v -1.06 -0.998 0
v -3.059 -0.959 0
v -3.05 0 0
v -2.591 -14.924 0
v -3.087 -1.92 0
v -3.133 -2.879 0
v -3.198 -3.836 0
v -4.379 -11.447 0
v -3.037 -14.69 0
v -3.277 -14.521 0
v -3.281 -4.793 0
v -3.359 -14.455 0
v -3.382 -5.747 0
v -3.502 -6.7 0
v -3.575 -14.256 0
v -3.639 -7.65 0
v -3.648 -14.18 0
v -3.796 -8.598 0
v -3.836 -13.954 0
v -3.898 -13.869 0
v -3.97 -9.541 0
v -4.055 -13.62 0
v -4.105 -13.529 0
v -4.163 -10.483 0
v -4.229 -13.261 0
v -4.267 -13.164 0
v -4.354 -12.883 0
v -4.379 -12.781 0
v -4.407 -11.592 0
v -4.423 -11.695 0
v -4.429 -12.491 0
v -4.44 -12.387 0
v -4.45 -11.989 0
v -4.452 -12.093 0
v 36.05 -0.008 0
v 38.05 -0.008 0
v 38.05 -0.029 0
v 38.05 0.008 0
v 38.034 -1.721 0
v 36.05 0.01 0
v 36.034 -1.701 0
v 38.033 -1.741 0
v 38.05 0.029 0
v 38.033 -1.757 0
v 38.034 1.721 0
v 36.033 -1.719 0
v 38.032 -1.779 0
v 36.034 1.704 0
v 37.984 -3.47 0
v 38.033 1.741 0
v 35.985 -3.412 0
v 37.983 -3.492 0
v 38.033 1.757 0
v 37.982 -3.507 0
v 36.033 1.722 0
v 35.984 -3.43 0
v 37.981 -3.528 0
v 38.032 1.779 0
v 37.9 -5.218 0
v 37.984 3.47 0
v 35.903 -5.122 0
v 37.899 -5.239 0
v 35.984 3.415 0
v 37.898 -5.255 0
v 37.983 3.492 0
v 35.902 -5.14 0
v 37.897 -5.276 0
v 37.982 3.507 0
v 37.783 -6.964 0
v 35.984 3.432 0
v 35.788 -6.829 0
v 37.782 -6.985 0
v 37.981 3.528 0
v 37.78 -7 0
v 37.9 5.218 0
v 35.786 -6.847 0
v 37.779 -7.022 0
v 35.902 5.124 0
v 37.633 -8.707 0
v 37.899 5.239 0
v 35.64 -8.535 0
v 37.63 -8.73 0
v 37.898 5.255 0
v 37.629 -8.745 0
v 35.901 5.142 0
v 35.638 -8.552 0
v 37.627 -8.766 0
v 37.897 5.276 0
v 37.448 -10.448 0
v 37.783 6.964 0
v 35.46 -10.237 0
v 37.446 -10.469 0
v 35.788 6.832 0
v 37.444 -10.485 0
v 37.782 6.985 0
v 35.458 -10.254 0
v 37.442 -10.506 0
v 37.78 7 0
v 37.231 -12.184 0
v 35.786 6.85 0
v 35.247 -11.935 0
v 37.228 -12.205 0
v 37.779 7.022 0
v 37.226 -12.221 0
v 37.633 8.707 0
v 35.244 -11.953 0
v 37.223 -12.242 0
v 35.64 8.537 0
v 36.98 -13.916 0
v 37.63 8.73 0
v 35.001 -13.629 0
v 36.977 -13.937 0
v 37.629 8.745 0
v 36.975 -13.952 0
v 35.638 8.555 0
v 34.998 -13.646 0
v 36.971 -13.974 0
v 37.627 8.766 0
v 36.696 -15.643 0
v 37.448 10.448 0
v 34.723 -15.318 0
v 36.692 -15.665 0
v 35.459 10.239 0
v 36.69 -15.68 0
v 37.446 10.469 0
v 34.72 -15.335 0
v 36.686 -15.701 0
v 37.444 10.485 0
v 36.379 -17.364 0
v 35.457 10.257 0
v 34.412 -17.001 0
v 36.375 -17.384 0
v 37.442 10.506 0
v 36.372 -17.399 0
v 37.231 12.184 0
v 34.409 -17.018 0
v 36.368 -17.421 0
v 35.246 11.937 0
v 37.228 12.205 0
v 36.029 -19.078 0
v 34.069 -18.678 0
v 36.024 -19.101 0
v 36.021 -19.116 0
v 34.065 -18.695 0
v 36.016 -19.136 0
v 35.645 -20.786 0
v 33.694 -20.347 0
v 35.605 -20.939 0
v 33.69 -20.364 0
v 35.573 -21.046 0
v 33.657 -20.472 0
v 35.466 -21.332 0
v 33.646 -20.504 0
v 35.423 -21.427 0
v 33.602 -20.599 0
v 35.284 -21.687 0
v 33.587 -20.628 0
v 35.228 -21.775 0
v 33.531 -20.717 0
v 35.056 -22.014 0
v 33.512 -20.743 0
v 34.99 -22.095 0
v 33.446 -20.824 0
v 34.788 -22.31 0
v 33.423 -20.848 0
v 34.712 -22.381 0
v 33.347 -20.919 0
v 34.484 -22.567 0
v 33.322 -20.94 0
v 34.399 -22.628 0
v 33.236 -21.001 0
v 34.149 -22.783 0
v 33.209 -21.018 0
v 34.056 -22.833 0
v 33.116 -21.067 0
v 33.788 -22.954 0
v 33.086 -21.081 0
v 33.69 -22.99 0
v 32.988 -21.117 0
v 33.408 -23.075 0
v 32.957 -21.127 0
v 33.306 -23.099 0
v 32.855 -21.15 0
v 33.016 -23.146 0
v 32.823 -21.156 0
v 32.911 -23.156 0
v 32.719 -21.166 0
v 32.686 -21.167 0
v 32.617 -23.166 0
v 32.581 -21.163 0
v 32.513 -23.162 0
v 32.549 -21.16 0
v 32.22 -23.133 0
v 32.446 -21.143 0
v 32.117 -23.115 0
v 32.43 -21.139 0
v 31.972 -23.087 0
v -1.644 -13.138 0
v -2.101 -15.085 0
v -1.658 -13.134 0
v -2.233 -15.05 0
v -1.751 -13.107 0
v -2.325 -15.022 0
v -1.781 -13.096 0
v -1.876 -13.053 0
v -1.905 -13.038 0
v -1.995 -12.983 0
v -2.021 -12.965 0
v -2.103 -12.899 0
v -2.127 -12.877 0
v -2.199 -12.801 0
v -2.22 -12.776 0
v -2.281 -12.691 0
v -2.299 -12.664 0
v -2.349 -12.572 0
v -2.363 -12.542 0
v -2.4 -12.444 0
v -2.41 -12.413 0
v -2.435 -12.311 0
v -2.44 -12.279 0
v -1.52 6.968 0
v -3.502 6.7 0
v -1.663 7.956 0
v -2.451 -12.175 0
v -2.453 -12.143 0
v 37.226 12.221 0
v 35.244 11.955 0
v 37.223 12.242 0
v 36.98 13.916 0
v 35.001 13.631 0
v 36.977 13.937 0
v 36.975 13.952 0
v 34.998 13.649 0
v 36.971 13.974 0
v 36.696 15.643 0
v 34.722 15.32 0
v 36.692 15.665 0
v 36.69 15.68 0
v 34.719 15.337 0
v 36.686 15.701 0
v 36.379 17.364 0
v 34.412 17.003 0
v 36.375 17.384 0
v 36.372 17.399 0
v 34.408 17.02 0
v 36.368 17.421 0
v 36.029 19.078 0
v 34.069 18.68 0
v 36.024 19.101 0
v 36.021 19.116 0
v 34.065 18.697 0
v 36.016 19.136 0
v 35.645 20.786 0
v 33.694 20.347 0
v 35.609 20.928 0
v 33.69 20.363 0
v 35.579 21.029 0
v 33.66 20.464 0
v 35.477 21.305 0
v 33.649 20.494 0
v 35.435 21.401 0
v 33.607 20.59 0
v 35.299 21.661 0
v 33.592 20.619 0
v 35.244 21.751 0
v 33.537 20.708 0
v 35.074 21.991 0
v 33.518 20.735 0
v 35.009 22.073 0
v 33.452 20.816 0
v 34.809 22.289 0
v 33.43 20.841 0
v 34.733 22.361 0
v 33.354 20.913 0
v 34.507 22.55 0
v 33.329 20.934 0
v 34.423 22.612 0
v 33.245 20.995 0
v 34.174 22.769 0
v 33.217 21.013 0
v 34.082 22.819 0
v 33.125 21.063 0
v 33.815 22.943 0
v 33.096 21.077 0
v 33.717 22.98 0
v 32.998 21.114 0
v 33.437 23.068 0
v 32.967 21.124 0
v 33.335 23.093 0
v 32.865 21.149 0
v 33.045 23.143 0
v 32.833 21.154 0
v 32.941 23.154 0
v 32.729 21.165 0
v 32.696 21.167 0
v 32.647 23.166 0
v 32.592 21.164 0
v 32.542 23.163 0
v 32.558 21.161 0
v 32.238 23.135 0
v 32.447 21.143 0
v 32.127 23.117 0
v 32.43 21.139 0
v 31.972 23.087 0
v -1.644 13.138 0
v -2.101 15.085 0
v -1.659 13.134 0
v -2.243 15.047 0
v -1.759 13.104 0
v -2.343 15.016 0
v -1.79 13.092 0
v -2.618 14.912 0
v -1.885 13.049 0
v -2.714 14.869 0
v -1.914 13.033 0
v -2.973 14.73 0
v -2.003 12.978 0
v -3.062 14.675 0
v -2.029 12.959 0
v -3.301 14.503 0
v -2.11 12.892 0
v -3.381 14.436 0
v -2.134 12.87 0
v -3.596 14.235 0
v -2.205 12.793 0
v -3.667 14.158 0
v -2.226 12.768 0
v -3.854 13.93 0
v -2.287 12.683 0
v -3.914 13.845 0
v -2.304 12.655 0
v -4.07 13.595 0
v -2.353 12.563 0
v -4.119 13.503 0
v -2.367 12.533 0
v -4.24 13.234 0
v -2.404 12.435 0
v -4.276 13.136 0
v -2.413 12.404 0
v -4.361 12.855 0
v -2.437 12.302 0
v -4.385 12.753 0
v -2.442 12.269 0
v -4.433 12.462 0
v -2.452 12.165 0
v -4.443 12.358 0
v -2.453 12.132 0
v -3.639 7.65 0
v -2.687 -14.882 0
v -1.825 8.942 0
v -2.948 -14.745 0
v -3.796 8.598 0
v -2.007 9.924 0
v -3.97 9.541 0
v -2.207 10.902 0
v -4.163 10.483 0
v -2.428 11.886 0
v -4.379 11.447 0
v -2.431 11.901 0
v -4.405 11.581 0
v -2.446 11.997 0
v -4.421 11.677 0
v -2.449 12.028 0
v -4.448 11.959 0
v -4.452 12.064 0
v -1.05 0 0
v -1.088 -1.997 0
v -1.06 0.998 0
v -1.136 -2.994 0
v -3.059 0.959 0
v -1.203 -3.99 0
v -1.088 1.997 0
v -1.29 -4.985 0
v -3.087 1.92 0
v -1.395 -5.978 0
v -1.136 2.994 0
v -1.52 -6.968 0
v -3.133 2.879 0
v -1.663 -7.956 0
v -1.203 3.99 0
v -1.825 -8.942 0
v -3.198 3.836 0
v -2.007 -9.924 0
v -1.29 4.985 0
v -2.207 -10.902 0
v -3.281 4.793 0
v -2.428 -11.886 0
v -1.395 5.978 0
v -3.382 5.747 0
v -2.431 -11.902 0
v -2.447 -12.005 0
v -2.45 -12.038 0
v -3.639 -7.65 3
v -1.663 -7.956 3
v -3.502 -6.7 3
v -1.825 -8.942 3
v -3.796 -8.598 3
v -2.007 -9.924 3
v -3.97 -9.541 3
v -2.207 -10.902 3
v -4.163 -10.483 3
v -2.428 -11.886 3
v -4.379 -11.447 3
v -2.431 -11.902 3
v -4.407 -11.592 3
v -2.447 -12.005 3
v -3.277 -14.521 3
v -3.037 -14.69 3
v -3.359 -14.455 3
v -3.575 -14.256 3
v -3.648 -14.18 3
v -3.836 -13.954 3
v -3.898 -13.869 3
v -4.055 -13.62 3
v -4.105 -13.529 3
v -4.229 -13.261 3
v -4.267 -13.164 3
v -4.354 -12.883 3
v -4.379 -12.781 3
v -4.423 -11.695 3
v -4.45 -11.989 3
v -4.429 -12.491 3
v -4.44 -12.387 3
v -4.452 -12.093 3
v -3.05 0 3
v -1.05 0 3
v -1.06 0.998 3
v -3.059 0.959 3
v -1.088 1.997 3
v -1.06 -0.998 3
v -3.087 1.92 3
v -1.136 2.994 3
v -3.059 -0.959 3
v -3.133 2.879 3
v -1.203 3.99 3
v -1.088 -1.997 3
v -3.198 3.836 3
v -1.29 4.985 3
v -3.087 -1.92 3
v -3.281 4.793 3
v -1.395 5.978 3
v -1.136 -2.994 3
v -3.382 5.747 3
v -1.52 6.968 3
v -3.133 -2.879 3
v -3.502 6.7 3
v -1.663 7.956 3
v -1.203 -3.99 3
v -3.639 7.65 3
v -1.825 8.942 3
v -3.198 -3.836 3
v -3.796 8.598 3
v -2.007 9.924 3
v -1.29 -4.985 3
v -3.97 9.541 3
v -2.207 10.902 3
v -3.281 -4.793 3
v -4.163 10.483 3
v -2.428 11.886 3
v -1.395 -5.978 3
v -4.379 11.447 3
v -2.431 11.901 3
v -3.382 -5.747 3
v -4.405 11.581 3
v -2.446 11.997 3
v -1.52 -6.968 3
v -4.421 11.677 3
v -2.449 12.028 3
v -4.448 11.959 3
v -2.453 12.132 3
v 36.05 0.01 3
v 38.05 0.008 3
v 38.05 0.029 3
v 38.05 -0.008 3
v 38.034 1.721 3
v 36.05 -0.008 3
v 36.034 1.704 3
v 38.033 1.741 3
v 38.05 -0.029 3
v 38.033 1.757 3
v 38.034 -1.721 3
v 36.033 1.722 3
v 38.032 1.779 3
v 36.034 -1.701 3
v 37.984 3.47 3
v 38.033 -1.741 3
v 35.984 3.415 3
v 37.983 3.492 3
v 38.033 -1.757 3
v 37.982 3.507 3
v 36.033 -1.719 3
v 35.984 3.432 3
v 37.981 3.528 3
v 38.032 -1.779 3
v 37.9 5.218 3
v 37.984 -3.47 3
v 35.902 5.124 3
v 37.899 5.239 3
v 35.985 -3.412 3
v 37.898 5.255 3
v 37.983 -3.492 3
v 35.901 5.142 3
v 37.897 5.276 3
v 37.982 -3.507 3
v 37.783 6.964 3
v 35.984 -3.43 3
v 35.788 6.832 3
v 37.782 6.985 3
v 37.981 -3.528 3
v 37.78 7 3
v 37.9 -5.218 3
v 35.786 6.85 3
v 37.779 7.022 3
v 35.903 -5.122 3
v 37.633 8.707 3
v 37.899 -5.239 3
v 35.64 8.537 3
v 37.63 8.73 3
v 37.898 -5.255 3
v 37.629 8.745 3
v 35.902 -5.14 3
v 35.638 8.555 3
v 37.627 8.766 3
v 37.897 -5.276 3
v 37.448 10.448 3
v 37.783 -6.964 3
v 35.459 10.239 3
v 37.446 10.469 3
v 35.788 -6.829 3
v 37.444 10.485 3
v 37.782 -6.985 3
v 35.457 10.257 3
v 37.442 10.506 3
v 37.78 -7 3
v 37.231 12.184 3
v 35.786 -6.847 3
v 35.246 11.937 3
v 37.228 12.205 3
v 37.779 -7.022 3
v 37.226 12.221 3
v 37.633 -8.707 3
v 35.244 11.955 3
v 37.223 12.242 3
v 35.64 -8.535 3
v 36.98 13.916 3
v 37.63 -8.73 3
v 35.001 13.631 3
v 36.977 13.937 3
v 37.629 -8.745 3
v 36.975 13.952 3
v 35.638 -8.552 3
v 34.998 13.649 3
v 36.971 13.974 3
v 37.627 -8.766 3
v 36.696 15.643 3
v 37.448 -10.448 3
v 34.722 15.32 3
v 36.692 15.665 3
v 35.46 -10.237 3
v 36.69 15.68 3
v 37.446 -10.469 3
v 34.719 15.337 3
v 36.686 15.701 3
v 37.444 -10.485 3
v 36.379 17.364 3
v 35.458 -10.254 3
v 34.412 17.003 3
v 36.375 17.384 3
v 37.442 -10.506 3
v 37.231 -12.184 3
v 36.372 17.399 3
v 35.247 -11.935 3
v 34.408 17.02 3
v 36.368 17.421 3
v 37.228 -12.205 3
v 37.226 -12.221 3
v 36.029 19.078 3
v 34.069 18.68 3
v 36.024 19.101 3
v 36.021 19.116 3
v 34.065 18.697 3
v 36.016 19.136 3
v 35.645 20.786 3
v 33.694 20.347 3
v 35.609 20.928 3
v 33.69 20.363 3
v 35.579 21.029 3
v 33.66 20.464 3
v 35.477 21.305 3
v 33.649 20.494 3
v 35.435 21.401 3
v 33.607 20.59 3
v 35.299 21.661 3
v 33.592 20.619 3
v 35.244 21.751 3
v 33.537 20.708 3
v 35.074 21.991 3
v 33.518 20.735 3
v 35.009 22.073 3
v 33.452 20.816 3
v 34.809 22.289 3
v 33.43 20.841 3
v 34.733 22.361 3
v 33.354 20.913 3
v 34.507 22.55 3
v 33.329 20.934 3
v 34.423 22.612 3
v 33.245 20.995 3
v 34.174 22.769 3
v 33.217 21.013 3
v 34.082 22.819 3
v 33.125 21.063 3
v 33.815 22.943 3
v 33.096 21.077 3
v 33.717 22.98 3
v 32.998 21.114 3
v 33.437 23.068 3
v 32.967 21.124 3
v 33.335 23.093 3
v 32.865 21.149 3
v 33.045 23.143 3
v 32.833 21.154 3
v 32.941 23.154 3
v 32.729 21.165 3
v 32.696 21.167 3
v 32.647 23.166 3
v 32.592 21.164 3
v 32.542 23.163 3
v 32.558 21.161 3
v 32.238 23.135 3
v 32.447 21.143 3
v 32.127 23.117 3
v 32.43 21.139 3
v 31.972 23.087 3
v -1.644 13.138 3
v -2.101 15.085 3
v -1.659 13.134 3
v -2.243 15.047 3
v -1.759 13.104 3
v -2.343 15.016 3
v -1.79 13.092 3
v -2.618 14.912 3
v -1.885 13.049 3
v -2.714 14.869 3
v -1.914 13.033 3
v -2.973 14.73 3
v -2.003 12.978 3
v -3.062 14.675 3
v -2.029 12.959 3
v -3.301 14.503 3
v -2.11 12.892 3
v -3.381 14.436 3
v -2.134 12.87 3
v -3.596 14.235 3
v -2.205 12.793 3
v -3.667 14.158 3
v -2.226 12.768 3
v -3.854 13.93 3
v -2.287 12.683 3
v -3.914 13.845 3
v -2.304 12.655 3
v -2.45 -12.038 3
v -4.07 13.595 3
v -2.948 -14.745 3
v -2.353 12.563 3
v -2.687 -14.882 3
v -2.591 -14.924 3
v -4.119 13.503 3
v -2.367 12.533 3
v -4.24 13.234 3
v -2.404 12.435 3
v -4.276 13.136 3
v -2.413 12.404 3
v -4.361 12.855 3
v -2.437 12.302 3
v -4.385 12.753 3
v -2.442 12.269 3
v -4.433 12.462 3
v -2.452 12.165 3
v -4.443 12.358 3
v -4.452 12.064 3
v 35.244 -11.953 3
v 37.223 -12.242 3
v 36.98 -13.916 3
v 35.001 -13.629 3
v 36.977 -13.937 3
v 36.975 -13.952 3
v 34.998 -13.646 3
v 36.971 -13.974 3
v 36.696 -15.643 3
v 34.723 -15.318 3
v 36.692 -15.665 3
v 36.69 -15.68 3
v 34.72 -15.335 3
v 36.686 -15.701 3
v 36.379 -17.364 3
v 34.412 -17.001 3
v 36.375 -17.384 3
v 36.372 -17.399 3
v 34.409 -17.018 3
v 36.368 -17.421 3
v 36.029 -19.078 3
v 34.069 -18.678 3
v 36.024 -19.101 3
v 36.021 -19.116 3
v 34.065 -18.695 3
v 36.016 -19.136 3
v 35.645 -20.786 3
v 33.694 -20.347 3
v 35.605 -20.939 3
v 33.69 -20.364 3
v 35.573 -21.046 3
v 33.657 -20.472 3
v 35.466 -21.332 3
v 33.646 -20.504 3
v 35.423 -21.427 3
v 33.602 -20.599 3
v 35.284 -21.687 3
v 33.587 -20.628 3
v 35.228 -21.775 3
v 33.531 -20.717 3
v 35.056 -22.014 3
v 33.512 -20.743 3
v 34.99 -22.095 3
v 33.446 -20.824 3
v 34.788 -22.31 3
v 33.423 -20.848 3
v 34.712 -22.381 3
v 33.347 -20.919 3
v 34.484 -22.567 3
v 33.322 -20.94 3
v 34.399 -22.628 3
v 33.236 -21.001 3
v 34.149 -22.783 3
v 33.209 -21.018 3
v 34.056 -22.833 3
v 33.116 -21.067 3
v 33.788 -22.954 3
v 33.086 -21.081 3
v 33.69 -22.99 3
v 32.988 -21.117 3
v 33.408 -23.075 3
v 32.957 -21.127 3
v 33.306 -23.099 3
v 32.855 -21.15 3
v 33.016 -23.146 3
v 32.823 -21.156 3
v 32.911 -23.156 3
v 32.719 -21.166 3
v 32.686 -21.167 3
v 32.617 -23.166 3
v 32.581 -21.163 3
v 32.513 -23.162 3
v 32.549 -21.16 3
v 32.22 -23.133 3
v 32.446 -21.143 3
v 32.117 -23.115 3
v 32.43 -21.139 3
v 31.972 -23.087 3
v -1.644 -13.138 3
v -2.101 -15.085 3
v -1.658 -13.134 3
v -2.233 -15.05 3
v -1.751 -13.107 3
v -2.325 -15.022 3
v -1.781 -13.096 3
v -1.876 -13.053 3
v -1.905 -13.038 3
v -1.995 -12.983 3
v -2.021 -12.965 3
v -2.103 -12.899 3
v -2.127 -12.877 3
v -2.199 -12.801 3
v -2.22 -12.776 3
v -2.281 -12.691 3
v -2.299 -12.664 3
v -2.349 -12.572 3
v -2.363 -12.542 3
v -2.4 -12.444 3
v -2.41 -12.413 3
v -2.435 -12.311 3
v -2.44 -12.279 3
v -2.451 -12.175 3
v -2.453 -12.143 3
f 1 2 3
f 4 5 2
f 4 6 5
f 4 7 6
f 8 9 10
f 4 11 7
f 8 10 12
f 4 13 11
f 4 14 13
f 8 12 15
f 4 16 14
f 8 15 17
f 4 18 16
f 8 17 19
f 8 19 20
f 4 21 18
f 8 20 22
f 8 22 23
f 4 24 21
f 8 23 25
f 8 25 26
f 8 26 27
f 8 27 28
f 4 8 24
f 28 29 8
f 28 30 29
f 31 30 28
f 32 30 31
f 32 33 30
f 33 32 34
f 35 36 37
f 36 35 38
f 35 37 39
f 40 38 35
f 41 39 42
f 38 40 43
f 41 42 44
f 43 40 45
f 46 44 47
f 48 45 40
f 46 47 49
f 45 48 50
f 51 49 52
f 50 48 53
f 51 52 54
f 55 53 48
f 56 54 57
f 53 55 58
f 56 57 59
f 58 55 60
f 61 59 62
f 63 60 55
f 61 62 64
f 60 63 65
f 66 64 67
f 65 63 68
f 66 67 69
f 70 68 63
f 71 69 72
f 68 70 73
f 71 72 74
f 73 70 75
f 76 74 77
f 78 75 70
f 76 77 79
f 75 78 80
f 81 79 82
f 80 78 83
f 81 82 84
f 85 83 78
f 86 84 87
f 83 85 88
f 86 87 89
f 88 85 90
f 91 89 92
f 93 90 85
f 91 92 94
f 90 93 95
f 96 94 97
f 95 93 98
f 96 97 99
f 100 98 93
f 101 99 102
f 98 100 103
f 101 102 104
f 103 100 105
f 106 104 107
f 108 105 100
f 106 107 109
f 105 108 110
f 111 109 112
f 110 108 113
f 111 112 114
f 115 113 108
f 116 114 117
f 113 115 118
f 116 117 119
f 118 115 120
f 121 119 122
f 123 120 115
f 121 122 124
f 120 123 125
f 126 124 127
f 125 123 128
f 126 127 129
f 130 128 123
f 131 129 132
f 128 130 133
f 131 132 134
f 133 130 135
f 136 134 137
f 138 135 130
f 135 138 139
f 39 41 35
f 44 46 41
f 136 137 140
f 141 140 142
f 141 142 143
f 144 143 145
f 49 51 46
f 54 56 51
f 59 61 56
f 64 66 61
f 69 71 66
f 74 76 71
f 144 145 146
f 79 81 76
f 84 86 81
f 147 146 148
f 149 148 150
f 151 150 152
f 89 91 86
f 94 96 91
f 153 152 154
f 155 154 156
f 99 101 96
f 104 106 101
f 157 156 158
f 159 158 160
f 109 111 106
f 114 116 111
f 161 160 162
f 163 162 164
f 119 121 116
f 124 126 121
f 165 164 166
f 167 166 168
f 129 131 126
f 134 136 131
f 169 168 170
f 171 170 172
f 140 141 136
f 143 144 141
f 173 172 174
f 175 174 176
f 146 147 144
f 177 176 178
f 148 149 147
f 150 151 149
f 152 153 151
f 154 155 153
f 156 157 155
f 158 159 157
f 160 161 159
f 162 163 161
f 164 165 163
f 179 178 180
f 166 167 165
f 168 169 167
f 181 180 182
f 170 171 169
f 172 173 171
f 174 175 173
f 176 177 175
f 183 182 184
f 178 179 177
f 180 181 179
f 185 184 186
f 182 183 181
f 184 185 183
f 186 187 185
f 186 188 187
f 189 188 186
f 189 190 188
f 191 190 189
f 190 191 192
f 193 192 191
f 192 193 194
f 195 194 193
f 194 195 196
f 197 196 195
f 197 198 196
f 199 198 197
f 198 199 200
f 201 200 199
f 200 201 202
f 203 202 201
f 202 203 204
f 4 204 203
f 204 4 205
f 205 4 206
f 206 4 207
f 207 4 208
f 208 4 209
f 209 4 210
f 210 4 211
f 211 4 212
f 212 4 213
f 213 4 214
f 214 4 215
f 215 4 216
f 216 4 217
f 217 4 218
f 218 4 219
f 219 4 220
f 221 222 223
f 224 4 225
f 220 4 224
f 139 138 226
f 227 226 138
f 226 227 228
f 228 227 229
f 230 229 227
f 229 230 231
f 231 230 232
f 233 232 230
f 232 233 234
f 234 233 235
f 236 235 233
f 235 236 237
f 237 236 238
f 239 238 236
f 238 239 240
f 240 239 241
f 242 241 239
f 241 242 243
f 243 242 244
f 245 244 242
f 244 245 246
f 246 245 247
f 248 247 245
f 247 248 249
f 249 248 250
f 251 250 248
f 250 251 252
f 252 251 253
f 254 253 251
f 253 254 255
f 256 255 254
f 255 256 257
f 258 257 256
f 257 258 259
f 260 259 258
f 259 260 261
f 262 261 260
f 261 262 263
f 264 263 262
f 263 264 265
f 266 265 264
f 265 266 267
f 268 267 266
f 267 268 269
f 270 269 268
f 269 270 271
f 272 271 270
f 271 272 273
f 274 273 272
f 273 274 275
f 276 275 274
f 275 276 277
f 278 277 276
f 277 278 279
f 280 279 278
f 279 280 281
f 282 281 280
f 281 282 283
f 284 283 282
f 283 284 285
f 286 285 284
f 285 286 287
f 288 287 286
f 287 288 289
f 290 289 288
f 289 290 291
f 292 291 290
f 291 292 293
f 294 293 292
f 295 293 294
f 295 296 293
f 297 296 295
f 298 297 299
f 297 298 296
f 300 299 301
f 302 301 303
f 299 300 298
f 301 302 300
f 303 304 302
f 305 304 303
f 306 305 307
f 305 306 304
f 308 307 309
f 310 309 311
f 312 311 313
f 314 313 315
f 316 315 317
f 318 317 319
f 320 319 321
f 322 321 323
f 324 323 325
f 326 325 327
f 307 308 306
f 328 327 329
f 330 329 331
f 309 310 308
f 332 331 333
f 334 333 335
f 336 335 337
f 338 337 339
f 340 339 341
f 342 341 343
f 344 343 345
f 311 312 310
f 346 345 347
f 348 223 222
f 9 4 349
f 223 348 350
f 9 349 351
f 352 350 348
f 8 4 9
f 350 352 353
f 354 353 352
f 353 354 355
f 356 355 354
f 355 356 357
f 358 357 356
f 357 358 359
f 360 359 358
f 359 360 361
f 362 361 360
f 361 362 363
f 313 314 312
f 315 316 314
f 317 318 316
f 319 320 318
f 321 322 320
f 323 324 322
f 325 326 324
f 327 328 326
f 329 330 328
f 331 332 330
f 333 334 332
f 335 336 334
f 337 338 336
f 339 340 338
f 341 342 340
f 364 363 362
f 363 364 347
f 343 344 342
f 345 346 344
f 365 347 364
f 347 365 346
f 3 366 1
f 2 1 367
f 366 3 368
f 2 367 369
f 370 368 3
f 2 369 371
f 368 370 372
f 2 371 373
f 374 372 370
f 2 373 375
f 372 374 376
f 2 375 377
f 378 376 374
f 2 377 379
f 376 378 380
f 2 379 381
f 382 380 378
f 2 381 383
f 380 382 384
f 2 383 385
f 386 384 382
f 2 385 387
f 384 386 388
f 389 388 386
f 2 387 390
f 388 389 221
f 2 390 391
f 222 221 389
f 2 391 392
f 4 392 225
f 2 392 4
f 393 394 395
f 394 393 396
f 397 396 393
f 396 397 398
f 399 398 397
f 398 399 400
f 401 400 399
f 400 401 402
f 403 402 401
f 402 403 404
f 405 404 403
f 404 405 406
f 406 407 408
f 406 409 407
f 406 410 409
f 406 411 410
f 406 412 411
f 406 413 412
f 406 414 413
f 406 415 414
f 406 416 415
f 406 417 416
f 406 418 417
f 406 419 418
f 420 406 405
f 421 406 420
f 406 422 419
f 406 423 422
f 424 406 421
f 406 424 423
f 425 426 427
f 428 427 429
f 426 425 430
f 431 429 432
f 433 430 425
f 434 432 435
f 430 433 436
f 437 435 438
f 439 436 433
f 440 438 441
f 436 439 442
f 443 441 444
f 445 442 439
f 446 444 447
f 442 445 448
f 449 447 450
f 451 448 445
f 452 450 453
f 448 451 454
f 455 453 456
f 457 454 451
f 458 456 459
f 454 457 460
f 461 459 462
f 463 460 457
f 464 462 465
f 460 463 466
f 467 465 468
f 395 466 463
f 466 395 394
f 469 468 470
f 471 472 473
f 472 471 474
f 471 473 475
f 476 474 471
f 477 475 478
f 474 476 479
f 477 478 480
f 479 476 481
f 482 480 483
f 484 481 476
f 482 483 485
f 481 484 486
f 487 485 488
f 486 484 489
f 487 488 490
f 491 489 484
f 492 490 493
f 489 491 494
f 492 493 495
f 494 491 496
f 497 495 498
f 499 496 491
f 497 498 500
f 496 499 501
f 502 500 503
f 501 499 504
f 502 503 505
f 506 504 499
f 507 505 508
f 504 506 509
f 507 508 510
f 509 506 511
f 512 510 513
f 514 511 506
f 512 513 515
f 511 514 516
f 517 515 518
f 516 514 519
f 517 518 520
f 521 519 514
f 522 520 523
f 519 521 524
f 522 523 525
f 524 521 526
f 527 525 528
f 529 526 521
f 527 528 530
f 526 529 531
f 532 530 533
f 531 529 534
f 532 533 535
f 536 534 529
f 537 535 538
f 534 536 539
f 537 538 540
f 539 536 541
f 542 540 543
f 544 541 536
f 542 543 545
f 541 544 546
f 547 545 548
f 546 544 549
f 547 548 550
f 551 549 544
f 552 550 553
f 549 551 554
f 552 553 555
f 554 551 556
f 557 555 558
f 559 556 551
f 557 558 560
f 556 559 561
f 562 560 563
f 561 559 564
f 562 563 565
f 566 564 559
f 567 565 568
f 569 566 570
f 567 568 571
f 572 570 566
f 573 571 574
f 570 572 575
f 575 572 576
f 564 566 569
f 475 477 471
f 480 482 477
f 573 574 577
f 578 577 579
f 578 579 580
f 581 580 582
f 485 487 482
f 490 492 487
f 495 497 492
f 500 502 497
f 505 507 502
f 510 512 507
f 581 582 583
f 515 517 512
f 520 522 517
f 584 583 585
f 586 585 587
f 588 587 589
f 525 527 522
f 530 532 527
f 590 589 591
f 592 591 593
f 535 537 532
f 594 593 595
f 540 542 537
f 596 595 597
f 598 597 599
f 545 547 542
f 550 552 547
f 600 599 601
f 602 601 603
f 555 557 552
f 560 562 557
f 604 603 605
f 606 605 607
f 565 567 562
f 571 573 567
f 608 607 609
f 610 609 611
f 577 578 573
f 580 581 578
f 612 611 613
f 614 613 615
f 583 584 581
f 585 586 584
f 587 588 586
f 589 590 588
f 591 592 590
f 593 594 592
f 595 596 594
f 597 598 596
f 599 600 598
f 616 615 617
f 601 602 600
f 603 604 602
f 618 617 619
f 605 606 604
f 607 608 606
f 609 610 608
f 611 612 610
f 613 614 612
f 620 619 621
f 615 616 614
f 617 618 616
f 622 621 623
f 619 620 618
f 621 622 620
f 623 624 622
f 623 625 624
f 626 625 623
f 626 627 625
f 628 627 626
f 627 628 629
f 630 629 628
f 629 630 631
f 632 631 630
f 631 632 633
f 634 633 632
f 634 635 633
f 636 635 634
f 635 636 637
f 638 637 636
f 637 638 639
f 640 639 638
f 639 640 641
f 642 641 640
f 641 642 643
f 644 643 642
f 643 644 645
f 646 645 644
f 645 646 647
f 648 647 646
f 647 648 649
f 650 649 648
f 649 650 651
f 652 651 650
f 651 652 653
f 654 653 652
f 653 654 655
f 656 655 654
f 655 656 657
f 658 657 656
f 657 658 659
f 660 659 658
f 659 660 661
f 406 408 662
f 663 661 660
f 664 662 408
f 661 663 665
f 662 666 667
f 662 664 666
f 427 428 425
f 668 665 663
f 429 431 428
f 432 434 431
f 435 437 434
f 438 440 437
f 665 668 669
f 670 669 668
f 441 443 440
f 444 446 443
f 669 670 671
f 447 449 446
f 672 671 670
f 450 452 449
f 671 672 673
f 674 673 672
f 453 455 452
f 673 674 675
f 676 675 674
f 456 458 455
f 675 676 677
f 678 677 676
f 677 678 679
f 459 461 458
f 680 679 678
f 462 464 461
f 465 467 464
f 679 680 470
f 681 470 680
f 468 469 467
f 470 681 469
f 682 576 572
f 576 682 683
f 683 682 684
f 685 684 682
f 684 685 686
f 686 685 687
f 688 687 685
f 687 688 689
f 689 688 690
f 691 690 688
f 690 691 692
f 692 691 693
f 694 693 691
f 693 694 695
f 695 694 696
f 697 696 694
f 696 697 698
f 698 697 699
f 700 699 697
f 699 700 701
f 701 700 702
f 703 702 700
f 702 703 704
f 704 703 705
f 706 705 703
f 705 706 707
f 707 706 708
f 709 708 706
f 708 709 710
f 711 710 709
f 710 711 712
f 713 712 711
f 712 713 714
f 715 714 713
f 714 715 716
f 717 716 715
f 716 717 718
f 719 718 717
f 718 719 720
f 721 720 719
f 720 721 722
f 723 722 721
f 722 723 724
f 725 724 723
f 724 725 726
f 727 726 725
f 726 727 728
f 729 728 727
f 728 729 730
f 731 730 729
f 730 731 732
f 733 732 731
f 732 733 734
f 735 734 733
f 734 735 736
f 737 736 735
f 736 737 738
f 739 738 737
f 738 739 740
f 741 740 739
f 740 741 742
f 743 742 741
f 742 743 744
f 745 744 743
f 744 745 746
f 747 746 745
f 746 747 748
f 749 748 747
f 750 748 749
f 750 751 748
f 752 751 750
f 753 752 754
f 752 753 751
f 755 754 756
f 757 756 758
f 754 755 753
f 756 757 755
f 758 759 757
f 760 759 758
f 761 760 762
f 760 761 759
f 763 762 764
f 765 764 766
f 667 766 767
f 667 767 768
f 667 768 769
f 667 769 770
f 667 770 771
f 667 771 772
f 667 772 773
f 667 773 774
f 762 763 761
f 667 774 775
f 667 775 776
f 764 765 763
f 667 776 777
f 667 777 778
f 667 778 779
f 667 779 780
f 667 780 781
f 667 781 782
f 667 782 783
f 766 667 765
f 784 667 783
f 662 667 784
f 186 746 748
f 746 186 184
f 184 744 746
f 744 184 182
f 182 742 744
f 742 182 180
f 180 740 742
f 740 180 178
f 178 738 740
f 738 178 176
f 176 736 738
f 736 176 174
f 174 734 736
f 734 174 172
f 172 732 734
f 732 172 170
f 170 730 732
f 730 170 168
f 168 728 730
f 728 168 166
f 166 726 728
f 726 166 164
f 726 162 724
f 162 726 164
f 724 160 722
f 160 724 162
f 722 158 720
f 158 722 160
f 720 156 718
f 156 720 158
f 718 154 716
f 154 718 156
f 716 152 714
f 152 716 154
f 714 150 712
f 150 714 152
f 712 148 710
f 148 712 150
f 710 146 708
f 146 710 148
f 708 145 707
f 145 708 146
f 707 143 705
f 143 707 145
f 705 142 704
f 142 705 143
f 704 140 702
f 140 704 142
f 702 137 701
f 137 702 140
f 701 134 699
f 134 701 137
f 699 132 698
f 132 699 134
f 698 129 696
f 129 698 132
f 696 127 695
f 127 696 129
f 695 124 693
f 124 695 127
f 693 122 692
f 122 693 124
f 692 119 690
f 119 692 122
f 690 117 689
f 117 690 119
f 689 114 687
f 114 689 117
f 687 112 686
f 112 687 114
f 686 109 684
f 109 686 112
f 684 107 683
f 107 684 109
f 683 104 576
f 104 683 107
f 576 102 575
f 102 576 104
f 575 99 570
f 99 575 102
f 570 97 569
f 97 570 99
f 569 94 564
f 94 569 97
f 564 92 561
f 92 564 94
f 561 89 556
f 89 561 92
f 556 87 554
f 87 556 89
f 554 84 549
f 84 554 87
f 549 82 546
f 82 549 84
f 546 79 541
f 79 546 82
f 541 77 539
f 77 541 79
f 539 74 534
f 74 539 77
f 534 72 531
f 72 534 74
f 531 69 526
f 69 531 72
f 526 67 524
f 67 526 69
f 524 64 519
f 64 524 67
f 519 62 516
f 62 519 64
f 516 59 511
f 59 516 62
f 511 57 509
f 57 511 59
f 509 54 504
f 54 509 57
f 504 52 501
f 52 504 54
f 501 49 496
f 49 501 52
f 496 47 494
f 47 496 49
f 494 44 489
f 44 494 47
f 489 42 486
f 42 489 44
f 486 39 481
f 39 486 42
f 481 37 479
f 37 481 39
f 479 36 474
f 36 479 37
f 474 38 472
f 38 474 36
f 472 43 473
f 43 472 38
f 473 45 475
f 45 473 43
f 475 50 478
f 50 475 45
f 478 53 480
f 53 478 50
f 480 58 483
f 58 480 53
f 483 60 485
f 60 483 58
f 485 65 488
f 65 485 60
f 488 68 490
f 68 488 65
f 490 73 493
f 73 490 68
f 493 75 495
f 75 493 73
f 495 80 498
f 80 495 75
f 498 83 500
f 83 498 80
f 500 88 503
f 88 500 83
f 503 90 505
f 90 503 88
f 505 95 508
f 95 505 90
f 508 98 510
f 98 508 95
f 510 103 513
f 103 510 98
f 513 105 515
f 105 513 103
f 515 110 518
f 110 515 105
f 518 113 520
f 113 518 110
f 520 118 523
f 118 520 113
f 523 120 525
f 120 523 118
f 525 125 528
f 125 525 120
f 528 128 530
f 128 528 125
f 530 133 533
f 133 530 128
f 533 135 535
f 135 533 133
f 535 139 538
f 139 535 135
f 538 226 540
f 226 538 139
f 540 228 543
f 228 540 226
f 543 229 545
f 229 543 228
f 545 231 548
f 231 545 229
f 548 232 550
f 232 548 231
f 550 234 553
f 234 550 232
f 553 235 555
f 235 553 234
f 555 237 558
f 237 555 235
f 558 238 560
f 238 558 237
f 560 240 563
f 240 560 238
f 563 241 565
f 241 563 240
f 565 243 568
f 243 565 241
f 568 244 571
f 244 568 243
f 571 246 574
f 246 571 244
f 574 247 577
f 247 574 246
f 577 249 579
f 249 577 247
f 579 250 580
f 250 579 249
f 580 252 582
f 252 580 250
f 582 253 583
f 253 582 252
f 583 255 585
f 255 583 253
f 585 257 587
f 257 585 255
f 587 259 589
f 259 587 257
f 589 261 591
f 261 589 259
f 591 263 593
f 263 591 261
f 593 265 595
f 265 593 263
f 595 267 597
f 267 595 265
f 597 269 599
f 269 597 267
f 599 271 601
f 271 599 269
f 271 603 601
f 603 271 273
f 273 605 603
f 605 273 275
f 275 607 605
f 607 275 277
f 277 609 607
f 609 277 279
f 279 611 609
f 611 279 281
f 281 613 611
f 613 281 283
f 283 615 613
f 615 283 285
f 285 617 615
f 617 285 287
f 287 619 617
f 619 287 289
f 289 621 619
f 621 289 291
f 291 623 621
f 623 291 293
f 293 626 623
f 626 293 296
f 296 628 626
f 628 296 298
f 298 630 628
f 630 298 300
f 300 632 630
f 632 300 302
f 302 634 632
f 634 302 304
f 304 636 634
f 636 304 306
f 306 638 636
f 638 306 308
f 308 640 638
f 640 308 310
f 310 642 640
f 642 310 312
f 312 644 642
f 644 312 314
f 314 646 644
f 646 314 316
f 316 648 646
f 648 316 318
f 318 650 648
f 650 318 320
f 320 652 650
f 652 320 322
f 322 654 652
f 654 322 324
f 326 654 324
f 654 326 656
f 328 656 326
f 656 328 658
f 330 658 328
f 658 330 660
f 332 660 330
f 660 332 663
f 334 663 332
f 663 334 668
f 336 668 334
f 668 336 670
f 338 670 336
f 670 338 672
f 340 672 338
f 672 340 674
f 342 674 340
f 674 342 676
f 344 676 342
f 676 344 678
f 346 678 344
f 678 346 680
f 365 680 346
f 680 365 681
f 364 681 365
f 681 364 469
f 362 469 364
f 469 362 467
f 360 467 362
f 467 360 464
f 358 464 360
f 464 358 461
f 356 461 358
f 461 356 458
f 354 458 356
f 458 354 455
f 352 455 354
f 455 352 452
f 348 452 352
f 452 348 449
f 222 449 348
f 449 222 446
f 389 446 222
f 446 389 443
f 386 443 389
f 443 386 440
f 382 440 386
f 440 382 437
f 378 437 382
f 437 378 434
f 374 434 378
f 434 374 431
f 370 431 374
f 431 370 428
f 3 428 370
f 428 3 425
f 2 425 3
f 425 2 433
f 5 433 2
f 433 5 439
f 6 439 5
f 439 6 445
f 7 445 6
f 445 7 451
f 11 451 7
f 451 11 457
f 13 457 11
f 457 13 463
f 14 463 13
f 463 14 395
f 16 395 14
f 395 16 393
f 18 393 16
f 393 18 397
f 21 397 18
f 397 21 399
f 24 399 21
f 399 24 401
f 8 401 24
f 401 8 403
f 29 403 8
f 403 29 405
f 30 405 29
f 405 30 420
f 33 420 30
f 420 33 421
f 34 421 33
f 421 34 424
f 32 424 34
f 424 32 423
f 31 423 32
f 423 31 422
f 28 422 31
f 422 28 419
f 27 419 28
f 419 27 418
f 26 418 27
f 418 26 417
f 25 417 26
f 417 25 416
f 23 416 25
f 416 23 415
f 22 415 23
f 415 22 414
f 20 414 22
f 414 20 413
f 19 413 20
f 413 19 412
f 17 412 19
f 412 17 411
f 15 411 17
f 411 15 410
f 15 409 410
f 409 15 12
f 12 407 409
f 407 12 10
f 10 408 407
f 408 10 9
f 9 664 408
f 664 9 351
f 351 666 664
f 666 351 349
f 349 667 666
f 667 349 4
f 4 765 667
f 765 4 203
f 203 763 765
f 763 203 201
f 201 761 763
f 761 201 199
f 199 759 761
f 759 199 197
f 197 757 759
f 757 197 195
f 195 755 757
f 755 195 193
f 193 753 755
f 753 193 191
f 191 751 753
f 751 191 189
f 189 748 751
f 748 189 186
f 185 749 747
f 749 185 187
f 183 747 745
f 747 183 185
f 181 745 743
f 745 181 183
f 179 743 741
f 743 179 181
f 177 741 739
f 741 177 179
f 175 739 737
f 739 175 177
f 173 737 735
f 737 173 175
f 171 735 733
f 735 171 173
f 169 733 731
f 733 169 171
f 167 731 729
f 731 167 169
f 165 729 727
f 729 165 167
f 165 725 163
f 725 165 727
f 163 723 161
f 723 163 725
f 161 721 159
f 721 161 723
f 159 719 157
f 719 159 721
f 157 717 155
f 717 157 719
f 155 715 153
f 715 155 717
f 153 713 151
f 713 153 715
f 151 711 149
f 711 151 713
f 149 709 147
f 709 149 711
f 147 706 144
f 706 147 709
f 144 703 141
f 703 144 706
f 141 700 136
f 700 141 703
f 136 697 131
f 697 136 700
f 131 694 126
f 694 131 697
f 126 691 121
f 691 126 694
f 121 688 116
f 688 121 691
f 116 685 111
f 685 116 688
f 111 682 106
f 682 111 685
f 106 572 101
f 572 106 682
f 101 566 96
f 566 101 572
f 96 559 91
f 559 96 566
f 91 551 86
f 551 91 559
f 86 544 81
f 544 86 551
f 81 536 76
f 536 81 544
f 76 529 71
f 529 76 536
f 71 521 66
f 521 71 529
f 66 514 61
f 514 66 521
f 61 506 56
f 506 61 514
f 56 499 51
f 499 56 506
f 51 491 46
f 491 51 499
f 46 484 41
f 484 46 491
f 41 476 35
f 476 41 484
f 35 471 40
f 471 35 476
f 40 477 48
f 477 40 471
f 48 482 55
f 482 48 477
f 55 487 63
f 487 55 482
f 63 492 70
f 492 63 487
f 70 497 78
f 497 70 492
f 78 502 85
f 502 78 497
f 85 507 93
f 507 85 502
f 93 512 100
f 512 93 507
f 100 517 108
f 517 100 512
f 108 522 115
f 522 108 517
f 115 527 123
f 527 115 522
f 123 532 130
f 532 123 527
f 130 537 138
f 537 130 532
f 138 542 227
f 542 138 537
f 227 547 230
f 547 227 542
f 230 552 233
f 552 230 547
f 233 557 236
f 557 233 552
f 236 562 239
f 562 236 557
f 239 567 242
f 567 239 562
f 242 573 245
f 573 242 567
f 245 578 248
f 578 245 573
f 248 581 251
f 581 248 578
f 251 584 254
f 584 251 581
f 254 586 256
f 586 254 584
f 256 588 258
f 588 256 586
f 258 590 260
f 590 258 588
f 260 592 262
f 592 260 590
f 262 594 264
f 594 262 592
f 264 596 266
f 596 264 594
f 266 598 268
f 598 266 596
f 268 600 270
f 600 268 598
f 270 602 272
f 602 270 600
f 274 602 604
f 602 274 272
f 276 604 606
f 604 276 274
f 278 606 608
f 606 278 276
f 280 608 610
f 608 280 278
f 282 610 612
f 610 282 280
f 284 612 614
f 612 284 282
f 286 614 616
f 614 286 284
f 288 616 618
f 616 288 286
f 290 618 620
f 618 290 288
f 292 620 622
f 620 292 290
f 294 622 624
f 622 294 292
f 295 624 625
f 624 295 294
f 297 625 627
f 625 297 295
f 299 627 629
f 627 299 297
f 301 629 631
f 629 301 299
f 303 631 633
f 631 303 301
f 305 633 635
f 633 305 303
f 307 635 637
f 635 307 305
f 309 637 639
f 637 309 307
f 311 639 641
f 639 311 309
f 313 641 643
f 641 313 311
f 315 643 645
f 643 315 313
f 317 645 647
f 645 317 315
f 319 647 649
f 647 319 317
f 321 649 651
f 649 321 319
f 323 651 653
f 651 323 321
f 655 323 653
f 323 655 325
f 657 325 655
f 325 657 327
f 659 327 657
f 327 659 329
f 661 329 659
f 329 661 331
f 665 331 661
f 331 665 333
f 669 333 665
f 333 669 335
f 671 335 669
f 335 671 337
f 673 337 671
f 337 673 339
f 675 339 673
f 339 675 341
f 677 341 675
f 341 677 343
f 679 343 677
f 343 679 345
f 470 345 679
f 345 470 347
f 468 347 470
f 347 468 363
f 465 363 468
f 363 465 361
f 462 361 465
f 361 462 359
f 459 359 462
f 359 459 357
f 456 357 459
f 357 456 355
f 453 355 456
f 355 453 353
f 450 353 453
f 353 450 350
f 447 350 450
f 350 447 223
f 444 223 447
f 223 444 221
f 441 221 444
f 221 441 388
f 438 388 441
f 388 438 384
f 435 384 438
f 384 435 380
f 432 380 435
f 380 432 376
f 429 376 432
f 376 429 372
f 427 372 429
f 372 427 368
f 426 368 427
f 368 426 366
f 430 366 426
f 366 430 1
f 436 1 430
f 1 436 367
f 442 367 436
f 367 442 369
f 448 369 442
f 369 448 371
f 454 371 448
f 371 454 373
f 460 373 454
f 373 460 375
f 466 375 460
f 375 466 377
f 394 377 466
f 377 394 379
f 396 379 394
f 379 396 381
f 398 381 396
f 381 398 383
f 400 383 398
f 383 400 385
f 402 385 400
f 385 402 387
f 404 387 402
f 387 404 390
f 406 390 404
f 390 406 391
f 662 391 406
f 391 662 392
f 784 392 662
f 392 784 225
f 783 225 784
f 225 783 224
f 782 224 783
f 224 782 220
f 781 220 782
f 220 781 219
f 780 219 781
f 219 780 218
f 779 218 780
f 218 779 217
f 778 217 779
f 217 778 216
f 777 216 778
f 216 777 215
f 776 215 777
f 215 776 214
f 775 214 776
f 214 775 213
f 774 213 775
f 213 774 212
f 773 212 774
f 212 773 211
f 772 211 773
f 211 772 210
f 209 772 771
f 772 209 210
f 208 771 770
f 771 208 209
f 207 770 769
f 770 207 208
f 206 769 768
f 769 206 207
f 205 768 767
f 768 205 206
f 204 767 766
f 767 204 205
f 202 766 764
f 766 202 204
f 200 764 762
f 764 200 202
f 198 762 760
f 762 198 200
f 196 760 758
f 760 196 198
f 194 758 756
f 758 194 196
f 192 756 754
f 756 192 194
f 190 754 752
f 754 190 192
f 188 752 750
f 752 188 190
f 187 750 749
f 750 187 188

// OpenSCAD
// file: parameters.scad
// =============================================================================
// Gen-BX — nightly 2026-10-11 (physics_scorer, honest magpylib watts)
// Gap reduction paid for by a bigger ring: the Gen-BU 8p/12c layout with the copper cut from 8.1 to 6.75 mm (magnet face to magnet face 10.70 → 9.35 mm, so Bz at the copper rises) and the lost window area won back radially, with the poles moved out to R71 and the bobbins stretched to r53–88. The scans show the thin-copper optimum only appears on the bigger ring (on R66 it gains far less), and R71 / Ø194 stator is the largest machine that still packs on one 410 mm plate.
// Clocking 0 deg (magnets N facing S) + D-flat keyed bore + index notch + flip-symmetric hole map.
// Windable 2-piece bobbin; turns = physics_scorer turns_fit; copper only between flanges.
// Steel back-iron: 2× Ø168 × 4.76 mm (3/16") mild-steel discs (steel_backiron_disc.dxf); magnets sit ON the steel
// (through-pockets) -> score with --back-iron. Night 2026-10-11.
// =============================================================================
topology            = "dual_rotor";

// --- Wire / winding (physics_scorer winding-fit) -------------------------------
wire_awg            = 26;
wire_od             = 0.45;     // insulated OD mm (bare 0.405)
fill_realistic      = 0.65;     // insulated-wire area / window (DENSE layered wind with a jig; scorer cap 0.65)
turns               = 410;       // = physics_scorer turns_fit (do NOT raise)
coil_former_type    = "bobbin";
coil_core_inset     = 14.87;     // radial copper build: hub = copper boundary inset by this
wind_build_axial    = 0.0;      // nothing proud of the flanges
wind_build_radial   = 0.0;

// --- Bobbin (base + lid) ---------------------------------------------------------
coil_id_r           = 53.00;    // copper boundary sector
coil_od_r           = 88.00;
span_deg            = 26.43;    // = pitch - 2*asin((wall+0.85)/coil_id_r) -> >=1.2 mm stator web
former_web          = 6.75;     // copper height between flanges (TALL copper: steel keeps Bz up)
flange_t            = 0.80;     // >= 0.8 mm FDM wall rule (tall winds push on the flanges)
wall                = 0.80;     // flange lip beyond copper
former_bare_h       = former_web + 2 * flange_t;
coil_envelope_h     = former_bare_h + 2 * wind_build_axial;
tab_w               = 7.0;
tab_len             = 7.0;
tab_h               = former_bare_h / 2;
pin_d               = 1.9;      // 1.75 mm filament locating pin
coil_mount_r        = coil_od_r + 0.2 + 4.0;
lead_y              = 1.6;
lead_slot_w         = 0.9;
lead_groove_d       = 0.6;

// --- Gap -------------------------------------------------------------------------
run_clear           = 0.50;     // rotor face -> flange
gap_spacer_h        = run_clear + wind_build_axial;
m2m                 = coil_envelope_h + 2 * run_clear;   // rotor face to rotor face (= gap_sleeve length)

// --- Stator ----------------------------------------------------------------------
coil_stations       = 12;
bay_clear           = 0.25;
stator_thick        = former_bare_h;                        // bobbins flush both faces
stator_od           = 194;
shaft_clear_stator  = 14.0;     // stator is static; gap sleeve OD 12 spins inside

// --- Rotor(s) --------------------------------------------------------------------
magnet_Br           = 1.43;     // N52
magnet_d_large      = 20.0;
magnet_h_large      = 5.0;      // one O20x5 per pocket
magnet_h_small      = 5.0;      // unused: no O5 pockets in this kit
halbach_magnetisation = "none";  // NO O5 assist magnets in this kit (scan: they lower the 4-pole score)
rotor_b_same_axis   = true;     // same-index magnets share one axis: N faces S across the gap
large_pocket_d      = 20.3;
small_pocket_d      = 5.3;
pocket_h            = 5.00;     // THROUGH the carrier: magnet back face sits on the steel disc (FLUSH seat: carrier = magnet height, magnet face level with the rotor face)
large_n             = 8;
R_large             = 71.0;
small_r_list        = [];       // no O5 pockets
carrier_od          = 168.0;
carrier_thick       = pocket_h;
hub_h               = 12.0;     // > steel_t + insert: radial set-screw clears the steel
hub_od              = 24.0;     // slim hub so the M4 brace rods fit at R~18 inside the coil ring
hub_insert_d        = 4.0;      // M3 heat-set insert, radial, bears on the D-flat
rotor_b_offset_deg  = 0.0;      // CLOCKING: magnets directly opposite
shaft_key           = "dflat";
dflat_depth         = 0.5;      // 8 mm shaft with 0.5 mm flat (7.5 across flat)
index_notch_d       = 3.0;

// --- Steel back-iron (buyable laser-cut) -------------------------------------------
steel_t             = 4.76;      // mild steel thickness (image method ignores it; sized from steel_flux.py so the return path stays well below saturation)
steel_center_hole   = 26.0;     // slips over the rotor hub (OD 24)
steel_od            = carrier_od;   // steel disc OD = rotor carrier OD

// --- Modular MAX interface ----------------------------------------------------------
shaft_bore          = 8.35;
dflat_x             = 4.0 - dflat_depth + (shaft_bore - 8.0) / 2;
bearing_d           = 21.85;
bearing_h           = 7.2;
m3_clear            = 3.5;
bolt_r_inner        = 30.0;     // M3 steel-disc clamp bolts (inside the magnet ring)
bolt_n_inner        = 4;
bolt_inner_angles   = [0, 90, 180, 270];
bolt_r_outer        = 44.0;     // second M3 steel-disc clamp ring
bolt_outer_angles   = [67.5, 112.5, 247.5, 292.5];
flange_bolt_r       = 91.5;     // frame rods: OUTSIDE the rotor OD (rotors spin inside them)
flange_bolt_n       = 4;
flange_bolt_offset  = 45.00;    // between coil stations -> never cuts a lead groove/tab
brace_r             = 18.0;
brace_d             = 4.3;      // temporary M4 jack rods (assembly only)
brace_n             = 4;
brace_angles        = [45, 135, 225, 315];          // flip-symmetric

spacer_pad_od       = 14.0;
spacer_pad_id       = m3_clear;
endbell_od          = 193.0;
endbell_thick       = 8.0;
endbell_shaft_clear = 10.0;
collar_h            = 10.0;
standoff_od         = 9.0;
frame_standoff_h    = run_clear + carrier_thick + hub_h + collar_h + 2.0;
sleeve_od           = 12.0;
plate_max_mm        = 410;

$fn = 64;
// main file
// Gen-BX — fit coupon (bay part): O20/O5 THROUGH pockets at carrier thickness (test on a steel offcut), 608 seat,
// D-flat bore, gap shim, and one bobbin-bay slice (bobbin footprint + bay_clear) to test former fit.
include <parameters.scad>;
$fn = 48;
// D-flat keyed bore: flat faces +X (angle 0 = magnet pocket 0 = index notch)
module dflat_bore(h) {
    intersection() {
        cylinder(d=shaft_bore, h=h);
        translate([-shaft_bore, -shaft_bore, 0]) cube([shaft_bore + dflat_x, 2*shaft_bore, h]);
    }
}
module sector_2d(r_in, r_out, ang) {
    polygon([
        for (a = [-ang/2 : ang/24 : ang/2]) [r_in*cos(a), r_in*sin(a)],
        for (a = [ang/2 : -ang/24 : -ang/2]) [r_out*cos(a), r_out*sin(a)]
    ]);
}
module footprint_2d() { offset(r=wall) sector_2d(coil_id_r, coil_od_r, span_deg); }
module hub_2d()       { offset(delta=-coil_core_inset) sector_2d(coil_id_r, coil_od_r, span_deg); }

// bay slice: 3 mm tall ring section of the stator bay around one footprint (tests bobbin drop-in fit)
translate([-coil_id_r, 0, 0]) difference() {
    linear_extrude(3) offset(r=bay_clear + 2) footprint_2d();
    translate([0, 0, -0.1]) linear_extrude(3.2) offset(r=bay_clear) footprint_2d();
}
